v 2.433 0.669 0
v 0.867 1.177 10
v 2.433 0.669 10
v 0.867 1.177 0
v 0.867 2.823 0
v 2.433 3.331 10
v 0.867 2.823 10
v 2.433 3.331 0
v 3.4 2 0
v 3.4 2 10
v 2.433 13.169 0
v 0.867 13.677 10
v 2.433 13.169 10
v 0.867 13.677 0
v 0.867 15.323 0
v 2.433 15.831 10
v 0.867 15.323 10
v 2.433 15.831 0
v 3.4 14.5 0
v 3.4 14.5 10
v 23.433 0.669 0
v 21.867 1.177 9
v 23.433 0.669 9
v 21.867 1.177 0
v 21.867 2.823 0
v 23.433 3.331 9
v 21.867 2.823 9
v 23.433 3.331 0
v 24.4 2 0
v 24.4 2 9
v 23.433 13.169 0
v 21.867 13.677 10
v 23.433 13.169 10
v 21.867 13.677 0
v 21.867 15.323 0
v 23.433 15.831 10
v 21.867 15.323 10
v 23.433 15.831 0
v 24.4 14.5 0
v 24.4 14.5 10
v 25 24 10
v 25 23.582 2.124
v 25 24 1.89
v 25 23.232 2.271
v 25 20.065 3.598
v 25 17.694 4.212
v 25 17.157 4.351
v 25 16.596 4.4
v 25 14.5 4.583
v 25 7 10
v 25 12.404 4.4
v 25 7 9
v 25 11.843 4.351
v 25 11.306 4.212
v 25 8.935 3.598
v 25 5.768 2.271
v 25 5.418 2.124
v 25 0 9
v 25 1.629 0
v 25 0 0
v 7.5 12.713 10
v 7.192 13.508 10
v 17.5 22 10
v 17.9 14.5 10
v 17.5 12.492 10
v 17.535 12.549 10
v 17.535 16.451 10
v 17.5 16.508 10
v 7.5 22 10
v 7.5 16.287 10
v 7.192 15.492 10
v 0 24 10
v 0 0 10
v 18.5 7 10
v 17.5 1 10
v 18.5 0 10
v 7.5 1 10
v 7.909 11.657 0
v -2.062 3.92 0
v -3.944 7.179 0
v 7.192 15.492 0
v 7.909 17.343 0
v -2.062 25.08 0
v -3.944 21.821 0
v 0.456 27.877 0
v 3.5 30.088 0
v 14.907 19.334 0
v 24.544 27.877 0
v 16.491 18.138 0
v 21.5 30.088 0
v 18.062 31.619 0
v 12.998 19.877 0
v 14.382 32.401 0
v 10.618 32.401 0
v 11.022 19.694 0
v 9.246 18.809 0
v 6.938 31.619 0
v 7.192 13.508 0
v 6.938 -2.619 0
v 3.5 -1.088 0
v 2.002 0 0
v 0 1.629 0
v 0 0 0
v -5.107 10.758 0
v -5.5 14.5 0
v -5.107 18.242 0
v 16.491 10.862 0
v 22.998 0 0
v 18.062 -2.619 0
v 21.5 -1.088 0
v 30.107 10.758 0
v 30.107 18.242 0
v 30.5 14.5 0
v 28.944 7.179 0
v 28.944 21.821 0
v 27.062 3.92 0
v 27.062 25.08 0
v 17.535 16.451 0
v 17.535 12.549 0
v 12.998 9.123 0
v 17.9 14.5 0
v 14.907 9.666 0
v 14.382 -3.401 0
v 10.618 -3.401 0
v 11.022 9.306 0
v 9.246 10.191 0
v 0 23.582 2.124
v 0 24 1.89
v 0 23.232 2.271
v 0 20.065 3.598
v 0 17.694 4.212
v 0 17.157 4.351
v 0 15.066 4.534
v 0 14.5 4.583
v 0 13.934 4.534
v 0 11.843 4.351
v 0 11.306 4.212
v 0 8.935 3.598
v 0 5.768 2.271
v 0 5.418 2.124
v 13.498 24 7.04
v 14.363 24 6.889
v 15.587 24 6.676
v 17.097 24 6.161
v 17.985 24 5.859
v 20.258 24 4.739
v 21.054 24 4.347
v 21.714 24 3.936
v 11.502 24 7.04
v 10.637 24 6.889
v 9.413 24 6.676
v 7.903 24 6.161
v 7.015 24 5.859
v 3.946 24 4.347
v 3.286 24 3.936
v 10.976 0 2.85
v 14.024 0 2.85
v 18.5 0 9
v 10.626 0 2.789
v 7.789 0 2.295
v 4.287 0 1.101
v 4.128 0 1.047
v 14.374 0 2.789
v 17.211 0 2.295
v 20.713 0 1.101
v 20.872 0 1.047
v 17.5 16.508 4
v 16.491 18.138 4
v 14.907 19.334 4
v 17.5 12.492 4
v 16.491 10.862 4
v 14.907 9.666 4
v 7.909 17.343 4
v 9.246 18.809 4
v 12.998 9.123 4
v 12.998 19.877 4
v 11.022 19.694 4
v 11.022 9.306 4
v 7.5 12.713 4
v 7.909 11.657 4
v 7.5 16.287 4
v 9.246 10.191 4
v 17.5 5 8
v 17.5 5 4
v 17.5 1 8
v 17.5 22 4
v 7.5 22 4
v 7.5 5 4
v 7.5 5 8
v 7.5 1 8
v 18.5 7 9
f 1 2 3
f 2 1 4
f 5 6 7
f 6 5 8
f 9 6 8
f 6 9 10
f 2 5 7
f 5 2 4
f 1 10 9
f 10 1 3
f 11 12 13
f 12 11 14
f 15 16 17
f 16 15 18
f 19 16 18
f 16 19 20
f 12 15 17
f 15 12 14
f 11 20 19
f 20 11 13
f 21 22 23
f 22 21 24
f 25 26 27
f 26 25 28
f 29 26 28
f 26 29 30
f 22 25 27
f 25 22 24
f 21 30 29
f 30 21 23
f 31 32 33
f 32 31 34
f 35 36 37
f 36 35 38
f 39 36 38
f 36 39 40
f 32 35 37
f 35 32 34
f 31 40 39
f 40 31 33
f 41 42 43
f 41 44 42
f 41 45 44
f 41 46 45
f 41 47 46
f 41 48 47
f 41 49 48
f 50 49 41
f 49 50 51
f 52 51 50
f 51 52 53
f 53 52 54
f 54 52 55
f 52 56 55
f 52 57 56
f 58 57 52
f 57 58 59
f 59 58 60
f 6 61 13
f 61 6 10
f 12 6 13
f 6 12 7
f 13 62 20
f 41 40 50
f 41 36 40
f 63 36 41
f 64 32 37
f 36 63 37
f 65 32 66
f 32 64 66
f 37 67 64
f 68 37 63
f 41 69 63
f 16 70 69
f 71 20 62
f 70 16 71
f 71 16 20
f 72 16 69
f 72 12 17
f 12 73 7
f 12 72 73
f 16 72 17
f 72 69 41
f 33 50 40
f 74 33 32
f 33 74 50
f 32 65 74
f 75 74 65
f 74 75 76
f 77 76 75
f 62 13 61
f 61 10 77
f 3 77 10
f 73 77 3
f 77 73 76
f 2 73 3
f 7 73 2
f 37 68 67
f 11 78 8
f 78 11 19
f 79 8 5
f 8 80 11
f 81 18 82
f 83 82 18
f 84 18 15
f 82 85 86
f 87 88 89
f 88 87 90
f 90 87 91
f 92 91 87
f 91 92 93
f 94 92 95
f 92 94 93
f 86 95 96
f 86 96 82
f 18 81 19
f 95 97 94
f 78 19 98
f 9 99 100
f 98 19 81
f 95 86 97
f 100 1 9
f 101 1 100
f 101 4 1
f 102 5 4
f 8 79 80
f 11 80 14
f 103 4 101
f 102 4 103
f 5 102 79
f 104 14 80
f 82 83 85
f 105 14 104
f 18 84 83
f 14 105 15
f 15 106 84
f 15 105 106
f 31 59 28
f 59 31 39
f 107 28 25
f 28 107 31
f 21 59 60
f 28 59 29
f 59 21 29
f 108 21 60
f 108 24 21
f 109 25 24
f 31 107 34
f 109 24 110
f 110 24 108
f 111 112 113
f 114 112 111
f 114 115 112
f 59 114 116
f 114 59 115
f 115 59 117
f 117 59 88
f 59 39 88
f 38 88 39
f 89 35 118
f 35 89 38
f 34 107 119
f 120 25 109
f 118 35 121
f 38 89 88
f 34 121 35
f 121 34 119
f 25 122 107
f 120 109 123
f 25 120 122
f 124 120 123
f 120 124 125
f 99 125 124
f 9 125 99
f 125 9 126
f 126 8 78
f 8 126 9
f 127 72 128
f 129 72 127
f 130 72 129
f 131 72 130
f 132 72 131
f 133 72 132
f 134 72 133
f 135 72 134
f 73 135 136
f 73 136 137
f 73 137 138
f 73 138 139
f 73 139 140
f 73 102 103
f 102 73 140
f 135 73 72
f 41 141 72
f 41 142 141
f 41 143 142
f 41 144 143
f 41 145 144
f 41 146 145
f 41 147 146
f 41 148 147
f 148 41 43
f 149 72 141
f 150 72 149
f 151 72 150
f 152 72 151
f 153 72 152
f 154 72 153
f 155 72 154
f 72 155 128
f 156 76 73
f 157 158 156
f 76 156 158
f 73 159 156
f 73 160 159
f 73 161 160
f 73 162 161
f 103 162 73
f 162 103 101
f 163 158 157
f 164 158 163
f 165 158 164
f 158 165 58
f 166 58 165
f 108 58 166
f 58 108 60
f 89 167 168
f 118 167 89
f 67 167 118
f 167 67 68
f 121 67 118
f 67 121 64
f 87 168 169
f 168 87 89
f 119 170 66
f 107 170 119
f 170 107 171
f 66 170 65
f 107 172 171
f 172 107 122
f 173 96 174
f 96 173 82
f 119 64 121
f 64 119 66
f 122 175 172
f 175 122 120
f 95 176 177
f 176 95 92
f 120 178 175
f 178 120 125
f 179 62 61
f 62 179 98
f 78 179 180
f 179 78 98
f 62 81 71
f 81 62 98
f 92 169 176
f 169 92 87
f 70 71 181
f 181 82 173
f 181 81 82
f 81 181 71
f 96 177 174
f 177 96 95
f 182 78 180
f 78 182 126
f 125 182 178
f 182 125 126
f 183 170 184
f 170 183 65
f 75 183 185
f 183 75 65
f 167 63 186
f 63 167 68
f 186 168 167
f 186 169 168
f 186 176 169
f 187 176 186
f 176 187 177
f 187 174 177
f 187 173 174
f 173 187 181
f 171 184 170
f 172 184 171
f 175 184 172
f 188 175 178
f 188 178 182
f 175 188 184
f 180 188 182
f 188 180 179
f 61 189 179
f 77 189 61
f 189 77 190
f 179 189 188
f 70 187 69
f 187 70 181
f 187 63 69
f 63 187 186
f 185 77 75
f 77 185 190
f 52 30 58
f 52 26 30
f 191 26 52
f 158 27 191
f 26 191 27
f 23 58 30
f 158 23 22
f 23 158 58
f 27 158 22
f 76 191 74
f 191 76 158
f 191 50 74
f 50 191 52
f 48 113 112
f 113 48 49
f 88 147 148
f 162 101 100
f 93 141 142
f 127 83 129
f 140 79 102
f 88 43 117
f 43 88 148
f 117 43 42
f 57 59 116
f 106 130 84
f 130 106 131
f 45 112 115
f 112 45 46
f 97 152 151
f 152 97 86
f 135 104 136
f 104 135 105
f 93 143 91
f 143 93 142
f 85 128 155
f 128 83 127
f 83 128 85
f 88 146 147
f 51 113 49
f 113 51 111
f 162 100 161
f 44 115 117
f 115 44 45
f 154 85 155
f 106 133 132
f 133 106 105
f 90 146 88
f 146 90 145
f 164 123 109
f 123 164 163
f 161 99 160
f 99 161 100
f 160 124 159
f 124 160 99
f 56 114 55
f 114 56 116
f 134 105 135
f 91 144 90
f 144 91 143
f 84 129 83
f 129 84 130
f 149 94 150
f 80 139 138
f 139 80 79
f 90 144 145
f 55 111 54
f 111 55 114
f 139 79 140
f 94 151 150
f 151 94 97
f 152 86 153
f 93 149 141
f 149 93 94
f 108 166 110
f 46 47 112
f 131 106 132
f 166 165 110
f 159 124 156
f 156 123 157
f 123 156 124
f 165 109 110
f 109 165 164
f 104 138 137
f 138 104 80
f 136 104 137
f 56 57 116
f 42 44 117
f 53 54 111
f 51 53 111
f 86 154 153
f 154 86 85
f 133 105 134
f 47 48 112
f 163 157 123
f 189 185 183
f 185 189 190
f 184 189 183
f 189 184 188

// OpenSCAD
depth = 10;
hole_r = 1.4;
kogeto_r_min = 5.4;
kogeto_r_max = 36/2;

difference()
{
	baseblock();
	translate([7.5,1,depth-6]) cube([10,21,7]);
	translate([18.5,-1,depth-1]) cube([8,8,2]);
}
translate([7.5,0,0]) cube([10,5,8]);

difference()
{
	translate([25/2, 14.5, 0]) cylinder(r2=kogeto_r_max-12, r1=kogeto_r_max, h=depth);
	translate([0,0,-0.1]) cube([25,24,depth+0.2]);

}

module baseblock()
{
	difference()
	{
		cube([25,24,depth]);
		translate([25/2, 14.5, -0.1]) cylinder(r=kogeto_r_min,h=depth+0.2);
		for (x=[2,23])
			for (y=[2,14.5])
				translate([x,y,-0.1])
					cylinder(r=hole_r,h=depth+0.2);
	}
}
